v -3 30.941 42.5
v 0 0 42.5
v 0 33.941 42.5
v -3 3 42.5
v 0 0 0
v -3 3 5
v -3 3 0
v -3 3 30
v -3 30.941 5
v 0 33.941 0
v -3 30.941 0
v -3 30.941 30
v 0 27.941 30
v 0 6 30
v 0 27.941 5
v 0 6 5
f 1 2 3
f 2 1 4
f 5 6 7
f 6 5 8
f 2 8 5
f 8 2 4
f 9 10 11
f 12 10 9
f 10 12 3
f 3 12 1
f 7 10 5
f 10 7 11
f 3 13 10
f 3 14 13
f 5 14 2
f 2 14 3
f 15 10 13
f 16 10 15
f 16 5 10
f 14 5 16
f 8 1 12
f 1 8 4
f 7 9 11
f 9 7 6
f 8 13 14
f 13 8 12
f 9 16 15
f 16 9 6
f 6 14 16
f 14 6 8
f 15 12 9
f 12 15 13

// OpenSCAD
// Microscope slide holder for RF-6000 Spectrofluorophotometer
// slide shroud

// Units are mm
// Parameters
slide_depth = 1; // Thickness of slide
slide_bottom = 12.5; // location of start of cut, where slide will rest
slide_width = 25; // in this case, it will be the height

shroud_thickness = 3;
notch = 5;
window_width = 7;

post_width = 24; // square base
post_height = 50 + notch - slide_bottom;

tolerance = 0.2; // for gaps to allow slide to pass

// Derived parameters
hypotenuse = ((2*(post_width^2))^(0.5));

difference() {
    rotate([0,0,45])
    translate([0,0,0])
    cube([post_width, post_width, post_height]);
    
    // cut off the connection side
    rotate([0,0,0])
    translate([0,0,-1])
    cube([(1+hypotenuse/2),1+hypotenuse,(2+post_height)]); // leading +1 are for extra
    
    // cut off the extra
    rotate([0,0,90])
    translate([0,shroud_thickness,-1]) // leave a base
    cube([1+hypotenuse,1+hypotenuse,(2+post_height)]); // leading +1 are for extra
    
    // cut out the window
    translate([-2*shroud_thickness, 0, notch])
    rotate([0,0,45])
    cube([post_width, post_width, slide_width]);
}
